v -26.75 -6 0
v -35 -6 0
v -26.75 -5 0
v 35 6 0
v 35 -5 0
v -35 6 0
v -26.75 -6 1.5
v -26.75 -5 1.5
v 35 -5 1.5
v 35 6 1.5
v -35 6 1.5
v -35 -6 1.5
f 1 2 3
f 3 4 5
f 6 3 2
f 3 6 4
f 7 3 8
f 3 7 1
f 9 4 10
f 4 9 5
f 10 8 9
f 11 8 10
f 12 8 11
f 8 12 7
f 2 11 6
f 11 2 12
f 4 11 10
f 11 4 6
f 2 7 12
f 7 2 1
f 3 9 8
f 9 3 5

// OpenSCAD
// Agarose gel comb - a flat plate with a back bar and a row of rectangular teeth for casting
// horizontal gels. NOVEL general part, SLS/FFF friendly.
//

teeth  = 10;
barL   = 70;
barW   = 12;
t      = 1.5;
toothW = 5.0;
toothL = 12;
gap    = 1.5;

$fn = 48;

teethX = toothW + gap;
fullX  = barL + 2 * teethX;                 // spine + overhanging teeth on both sides
halfX  = barL / 2;

difference() {
    union() {
        translate([-barL / 2, -barW / 2, 0]) cube([barL, barW, t]);                 // spine
        for (i = [0 : teeth - 1])
            translate([halfX - teethX * (i + 0.5), -barW / 2 - toothL - 0.01, 0])
                cube([teethX, toothL, t]);                                        // teeth
    }
    for (i = [0 : teeth - 1])
        translate([halfX - teethX * (i + 0.5), -barW / 2 - toothL - 1, 0])
            cube([teethX, toothL + 2, t + 1]);                                    // cut the tooth roots
}
